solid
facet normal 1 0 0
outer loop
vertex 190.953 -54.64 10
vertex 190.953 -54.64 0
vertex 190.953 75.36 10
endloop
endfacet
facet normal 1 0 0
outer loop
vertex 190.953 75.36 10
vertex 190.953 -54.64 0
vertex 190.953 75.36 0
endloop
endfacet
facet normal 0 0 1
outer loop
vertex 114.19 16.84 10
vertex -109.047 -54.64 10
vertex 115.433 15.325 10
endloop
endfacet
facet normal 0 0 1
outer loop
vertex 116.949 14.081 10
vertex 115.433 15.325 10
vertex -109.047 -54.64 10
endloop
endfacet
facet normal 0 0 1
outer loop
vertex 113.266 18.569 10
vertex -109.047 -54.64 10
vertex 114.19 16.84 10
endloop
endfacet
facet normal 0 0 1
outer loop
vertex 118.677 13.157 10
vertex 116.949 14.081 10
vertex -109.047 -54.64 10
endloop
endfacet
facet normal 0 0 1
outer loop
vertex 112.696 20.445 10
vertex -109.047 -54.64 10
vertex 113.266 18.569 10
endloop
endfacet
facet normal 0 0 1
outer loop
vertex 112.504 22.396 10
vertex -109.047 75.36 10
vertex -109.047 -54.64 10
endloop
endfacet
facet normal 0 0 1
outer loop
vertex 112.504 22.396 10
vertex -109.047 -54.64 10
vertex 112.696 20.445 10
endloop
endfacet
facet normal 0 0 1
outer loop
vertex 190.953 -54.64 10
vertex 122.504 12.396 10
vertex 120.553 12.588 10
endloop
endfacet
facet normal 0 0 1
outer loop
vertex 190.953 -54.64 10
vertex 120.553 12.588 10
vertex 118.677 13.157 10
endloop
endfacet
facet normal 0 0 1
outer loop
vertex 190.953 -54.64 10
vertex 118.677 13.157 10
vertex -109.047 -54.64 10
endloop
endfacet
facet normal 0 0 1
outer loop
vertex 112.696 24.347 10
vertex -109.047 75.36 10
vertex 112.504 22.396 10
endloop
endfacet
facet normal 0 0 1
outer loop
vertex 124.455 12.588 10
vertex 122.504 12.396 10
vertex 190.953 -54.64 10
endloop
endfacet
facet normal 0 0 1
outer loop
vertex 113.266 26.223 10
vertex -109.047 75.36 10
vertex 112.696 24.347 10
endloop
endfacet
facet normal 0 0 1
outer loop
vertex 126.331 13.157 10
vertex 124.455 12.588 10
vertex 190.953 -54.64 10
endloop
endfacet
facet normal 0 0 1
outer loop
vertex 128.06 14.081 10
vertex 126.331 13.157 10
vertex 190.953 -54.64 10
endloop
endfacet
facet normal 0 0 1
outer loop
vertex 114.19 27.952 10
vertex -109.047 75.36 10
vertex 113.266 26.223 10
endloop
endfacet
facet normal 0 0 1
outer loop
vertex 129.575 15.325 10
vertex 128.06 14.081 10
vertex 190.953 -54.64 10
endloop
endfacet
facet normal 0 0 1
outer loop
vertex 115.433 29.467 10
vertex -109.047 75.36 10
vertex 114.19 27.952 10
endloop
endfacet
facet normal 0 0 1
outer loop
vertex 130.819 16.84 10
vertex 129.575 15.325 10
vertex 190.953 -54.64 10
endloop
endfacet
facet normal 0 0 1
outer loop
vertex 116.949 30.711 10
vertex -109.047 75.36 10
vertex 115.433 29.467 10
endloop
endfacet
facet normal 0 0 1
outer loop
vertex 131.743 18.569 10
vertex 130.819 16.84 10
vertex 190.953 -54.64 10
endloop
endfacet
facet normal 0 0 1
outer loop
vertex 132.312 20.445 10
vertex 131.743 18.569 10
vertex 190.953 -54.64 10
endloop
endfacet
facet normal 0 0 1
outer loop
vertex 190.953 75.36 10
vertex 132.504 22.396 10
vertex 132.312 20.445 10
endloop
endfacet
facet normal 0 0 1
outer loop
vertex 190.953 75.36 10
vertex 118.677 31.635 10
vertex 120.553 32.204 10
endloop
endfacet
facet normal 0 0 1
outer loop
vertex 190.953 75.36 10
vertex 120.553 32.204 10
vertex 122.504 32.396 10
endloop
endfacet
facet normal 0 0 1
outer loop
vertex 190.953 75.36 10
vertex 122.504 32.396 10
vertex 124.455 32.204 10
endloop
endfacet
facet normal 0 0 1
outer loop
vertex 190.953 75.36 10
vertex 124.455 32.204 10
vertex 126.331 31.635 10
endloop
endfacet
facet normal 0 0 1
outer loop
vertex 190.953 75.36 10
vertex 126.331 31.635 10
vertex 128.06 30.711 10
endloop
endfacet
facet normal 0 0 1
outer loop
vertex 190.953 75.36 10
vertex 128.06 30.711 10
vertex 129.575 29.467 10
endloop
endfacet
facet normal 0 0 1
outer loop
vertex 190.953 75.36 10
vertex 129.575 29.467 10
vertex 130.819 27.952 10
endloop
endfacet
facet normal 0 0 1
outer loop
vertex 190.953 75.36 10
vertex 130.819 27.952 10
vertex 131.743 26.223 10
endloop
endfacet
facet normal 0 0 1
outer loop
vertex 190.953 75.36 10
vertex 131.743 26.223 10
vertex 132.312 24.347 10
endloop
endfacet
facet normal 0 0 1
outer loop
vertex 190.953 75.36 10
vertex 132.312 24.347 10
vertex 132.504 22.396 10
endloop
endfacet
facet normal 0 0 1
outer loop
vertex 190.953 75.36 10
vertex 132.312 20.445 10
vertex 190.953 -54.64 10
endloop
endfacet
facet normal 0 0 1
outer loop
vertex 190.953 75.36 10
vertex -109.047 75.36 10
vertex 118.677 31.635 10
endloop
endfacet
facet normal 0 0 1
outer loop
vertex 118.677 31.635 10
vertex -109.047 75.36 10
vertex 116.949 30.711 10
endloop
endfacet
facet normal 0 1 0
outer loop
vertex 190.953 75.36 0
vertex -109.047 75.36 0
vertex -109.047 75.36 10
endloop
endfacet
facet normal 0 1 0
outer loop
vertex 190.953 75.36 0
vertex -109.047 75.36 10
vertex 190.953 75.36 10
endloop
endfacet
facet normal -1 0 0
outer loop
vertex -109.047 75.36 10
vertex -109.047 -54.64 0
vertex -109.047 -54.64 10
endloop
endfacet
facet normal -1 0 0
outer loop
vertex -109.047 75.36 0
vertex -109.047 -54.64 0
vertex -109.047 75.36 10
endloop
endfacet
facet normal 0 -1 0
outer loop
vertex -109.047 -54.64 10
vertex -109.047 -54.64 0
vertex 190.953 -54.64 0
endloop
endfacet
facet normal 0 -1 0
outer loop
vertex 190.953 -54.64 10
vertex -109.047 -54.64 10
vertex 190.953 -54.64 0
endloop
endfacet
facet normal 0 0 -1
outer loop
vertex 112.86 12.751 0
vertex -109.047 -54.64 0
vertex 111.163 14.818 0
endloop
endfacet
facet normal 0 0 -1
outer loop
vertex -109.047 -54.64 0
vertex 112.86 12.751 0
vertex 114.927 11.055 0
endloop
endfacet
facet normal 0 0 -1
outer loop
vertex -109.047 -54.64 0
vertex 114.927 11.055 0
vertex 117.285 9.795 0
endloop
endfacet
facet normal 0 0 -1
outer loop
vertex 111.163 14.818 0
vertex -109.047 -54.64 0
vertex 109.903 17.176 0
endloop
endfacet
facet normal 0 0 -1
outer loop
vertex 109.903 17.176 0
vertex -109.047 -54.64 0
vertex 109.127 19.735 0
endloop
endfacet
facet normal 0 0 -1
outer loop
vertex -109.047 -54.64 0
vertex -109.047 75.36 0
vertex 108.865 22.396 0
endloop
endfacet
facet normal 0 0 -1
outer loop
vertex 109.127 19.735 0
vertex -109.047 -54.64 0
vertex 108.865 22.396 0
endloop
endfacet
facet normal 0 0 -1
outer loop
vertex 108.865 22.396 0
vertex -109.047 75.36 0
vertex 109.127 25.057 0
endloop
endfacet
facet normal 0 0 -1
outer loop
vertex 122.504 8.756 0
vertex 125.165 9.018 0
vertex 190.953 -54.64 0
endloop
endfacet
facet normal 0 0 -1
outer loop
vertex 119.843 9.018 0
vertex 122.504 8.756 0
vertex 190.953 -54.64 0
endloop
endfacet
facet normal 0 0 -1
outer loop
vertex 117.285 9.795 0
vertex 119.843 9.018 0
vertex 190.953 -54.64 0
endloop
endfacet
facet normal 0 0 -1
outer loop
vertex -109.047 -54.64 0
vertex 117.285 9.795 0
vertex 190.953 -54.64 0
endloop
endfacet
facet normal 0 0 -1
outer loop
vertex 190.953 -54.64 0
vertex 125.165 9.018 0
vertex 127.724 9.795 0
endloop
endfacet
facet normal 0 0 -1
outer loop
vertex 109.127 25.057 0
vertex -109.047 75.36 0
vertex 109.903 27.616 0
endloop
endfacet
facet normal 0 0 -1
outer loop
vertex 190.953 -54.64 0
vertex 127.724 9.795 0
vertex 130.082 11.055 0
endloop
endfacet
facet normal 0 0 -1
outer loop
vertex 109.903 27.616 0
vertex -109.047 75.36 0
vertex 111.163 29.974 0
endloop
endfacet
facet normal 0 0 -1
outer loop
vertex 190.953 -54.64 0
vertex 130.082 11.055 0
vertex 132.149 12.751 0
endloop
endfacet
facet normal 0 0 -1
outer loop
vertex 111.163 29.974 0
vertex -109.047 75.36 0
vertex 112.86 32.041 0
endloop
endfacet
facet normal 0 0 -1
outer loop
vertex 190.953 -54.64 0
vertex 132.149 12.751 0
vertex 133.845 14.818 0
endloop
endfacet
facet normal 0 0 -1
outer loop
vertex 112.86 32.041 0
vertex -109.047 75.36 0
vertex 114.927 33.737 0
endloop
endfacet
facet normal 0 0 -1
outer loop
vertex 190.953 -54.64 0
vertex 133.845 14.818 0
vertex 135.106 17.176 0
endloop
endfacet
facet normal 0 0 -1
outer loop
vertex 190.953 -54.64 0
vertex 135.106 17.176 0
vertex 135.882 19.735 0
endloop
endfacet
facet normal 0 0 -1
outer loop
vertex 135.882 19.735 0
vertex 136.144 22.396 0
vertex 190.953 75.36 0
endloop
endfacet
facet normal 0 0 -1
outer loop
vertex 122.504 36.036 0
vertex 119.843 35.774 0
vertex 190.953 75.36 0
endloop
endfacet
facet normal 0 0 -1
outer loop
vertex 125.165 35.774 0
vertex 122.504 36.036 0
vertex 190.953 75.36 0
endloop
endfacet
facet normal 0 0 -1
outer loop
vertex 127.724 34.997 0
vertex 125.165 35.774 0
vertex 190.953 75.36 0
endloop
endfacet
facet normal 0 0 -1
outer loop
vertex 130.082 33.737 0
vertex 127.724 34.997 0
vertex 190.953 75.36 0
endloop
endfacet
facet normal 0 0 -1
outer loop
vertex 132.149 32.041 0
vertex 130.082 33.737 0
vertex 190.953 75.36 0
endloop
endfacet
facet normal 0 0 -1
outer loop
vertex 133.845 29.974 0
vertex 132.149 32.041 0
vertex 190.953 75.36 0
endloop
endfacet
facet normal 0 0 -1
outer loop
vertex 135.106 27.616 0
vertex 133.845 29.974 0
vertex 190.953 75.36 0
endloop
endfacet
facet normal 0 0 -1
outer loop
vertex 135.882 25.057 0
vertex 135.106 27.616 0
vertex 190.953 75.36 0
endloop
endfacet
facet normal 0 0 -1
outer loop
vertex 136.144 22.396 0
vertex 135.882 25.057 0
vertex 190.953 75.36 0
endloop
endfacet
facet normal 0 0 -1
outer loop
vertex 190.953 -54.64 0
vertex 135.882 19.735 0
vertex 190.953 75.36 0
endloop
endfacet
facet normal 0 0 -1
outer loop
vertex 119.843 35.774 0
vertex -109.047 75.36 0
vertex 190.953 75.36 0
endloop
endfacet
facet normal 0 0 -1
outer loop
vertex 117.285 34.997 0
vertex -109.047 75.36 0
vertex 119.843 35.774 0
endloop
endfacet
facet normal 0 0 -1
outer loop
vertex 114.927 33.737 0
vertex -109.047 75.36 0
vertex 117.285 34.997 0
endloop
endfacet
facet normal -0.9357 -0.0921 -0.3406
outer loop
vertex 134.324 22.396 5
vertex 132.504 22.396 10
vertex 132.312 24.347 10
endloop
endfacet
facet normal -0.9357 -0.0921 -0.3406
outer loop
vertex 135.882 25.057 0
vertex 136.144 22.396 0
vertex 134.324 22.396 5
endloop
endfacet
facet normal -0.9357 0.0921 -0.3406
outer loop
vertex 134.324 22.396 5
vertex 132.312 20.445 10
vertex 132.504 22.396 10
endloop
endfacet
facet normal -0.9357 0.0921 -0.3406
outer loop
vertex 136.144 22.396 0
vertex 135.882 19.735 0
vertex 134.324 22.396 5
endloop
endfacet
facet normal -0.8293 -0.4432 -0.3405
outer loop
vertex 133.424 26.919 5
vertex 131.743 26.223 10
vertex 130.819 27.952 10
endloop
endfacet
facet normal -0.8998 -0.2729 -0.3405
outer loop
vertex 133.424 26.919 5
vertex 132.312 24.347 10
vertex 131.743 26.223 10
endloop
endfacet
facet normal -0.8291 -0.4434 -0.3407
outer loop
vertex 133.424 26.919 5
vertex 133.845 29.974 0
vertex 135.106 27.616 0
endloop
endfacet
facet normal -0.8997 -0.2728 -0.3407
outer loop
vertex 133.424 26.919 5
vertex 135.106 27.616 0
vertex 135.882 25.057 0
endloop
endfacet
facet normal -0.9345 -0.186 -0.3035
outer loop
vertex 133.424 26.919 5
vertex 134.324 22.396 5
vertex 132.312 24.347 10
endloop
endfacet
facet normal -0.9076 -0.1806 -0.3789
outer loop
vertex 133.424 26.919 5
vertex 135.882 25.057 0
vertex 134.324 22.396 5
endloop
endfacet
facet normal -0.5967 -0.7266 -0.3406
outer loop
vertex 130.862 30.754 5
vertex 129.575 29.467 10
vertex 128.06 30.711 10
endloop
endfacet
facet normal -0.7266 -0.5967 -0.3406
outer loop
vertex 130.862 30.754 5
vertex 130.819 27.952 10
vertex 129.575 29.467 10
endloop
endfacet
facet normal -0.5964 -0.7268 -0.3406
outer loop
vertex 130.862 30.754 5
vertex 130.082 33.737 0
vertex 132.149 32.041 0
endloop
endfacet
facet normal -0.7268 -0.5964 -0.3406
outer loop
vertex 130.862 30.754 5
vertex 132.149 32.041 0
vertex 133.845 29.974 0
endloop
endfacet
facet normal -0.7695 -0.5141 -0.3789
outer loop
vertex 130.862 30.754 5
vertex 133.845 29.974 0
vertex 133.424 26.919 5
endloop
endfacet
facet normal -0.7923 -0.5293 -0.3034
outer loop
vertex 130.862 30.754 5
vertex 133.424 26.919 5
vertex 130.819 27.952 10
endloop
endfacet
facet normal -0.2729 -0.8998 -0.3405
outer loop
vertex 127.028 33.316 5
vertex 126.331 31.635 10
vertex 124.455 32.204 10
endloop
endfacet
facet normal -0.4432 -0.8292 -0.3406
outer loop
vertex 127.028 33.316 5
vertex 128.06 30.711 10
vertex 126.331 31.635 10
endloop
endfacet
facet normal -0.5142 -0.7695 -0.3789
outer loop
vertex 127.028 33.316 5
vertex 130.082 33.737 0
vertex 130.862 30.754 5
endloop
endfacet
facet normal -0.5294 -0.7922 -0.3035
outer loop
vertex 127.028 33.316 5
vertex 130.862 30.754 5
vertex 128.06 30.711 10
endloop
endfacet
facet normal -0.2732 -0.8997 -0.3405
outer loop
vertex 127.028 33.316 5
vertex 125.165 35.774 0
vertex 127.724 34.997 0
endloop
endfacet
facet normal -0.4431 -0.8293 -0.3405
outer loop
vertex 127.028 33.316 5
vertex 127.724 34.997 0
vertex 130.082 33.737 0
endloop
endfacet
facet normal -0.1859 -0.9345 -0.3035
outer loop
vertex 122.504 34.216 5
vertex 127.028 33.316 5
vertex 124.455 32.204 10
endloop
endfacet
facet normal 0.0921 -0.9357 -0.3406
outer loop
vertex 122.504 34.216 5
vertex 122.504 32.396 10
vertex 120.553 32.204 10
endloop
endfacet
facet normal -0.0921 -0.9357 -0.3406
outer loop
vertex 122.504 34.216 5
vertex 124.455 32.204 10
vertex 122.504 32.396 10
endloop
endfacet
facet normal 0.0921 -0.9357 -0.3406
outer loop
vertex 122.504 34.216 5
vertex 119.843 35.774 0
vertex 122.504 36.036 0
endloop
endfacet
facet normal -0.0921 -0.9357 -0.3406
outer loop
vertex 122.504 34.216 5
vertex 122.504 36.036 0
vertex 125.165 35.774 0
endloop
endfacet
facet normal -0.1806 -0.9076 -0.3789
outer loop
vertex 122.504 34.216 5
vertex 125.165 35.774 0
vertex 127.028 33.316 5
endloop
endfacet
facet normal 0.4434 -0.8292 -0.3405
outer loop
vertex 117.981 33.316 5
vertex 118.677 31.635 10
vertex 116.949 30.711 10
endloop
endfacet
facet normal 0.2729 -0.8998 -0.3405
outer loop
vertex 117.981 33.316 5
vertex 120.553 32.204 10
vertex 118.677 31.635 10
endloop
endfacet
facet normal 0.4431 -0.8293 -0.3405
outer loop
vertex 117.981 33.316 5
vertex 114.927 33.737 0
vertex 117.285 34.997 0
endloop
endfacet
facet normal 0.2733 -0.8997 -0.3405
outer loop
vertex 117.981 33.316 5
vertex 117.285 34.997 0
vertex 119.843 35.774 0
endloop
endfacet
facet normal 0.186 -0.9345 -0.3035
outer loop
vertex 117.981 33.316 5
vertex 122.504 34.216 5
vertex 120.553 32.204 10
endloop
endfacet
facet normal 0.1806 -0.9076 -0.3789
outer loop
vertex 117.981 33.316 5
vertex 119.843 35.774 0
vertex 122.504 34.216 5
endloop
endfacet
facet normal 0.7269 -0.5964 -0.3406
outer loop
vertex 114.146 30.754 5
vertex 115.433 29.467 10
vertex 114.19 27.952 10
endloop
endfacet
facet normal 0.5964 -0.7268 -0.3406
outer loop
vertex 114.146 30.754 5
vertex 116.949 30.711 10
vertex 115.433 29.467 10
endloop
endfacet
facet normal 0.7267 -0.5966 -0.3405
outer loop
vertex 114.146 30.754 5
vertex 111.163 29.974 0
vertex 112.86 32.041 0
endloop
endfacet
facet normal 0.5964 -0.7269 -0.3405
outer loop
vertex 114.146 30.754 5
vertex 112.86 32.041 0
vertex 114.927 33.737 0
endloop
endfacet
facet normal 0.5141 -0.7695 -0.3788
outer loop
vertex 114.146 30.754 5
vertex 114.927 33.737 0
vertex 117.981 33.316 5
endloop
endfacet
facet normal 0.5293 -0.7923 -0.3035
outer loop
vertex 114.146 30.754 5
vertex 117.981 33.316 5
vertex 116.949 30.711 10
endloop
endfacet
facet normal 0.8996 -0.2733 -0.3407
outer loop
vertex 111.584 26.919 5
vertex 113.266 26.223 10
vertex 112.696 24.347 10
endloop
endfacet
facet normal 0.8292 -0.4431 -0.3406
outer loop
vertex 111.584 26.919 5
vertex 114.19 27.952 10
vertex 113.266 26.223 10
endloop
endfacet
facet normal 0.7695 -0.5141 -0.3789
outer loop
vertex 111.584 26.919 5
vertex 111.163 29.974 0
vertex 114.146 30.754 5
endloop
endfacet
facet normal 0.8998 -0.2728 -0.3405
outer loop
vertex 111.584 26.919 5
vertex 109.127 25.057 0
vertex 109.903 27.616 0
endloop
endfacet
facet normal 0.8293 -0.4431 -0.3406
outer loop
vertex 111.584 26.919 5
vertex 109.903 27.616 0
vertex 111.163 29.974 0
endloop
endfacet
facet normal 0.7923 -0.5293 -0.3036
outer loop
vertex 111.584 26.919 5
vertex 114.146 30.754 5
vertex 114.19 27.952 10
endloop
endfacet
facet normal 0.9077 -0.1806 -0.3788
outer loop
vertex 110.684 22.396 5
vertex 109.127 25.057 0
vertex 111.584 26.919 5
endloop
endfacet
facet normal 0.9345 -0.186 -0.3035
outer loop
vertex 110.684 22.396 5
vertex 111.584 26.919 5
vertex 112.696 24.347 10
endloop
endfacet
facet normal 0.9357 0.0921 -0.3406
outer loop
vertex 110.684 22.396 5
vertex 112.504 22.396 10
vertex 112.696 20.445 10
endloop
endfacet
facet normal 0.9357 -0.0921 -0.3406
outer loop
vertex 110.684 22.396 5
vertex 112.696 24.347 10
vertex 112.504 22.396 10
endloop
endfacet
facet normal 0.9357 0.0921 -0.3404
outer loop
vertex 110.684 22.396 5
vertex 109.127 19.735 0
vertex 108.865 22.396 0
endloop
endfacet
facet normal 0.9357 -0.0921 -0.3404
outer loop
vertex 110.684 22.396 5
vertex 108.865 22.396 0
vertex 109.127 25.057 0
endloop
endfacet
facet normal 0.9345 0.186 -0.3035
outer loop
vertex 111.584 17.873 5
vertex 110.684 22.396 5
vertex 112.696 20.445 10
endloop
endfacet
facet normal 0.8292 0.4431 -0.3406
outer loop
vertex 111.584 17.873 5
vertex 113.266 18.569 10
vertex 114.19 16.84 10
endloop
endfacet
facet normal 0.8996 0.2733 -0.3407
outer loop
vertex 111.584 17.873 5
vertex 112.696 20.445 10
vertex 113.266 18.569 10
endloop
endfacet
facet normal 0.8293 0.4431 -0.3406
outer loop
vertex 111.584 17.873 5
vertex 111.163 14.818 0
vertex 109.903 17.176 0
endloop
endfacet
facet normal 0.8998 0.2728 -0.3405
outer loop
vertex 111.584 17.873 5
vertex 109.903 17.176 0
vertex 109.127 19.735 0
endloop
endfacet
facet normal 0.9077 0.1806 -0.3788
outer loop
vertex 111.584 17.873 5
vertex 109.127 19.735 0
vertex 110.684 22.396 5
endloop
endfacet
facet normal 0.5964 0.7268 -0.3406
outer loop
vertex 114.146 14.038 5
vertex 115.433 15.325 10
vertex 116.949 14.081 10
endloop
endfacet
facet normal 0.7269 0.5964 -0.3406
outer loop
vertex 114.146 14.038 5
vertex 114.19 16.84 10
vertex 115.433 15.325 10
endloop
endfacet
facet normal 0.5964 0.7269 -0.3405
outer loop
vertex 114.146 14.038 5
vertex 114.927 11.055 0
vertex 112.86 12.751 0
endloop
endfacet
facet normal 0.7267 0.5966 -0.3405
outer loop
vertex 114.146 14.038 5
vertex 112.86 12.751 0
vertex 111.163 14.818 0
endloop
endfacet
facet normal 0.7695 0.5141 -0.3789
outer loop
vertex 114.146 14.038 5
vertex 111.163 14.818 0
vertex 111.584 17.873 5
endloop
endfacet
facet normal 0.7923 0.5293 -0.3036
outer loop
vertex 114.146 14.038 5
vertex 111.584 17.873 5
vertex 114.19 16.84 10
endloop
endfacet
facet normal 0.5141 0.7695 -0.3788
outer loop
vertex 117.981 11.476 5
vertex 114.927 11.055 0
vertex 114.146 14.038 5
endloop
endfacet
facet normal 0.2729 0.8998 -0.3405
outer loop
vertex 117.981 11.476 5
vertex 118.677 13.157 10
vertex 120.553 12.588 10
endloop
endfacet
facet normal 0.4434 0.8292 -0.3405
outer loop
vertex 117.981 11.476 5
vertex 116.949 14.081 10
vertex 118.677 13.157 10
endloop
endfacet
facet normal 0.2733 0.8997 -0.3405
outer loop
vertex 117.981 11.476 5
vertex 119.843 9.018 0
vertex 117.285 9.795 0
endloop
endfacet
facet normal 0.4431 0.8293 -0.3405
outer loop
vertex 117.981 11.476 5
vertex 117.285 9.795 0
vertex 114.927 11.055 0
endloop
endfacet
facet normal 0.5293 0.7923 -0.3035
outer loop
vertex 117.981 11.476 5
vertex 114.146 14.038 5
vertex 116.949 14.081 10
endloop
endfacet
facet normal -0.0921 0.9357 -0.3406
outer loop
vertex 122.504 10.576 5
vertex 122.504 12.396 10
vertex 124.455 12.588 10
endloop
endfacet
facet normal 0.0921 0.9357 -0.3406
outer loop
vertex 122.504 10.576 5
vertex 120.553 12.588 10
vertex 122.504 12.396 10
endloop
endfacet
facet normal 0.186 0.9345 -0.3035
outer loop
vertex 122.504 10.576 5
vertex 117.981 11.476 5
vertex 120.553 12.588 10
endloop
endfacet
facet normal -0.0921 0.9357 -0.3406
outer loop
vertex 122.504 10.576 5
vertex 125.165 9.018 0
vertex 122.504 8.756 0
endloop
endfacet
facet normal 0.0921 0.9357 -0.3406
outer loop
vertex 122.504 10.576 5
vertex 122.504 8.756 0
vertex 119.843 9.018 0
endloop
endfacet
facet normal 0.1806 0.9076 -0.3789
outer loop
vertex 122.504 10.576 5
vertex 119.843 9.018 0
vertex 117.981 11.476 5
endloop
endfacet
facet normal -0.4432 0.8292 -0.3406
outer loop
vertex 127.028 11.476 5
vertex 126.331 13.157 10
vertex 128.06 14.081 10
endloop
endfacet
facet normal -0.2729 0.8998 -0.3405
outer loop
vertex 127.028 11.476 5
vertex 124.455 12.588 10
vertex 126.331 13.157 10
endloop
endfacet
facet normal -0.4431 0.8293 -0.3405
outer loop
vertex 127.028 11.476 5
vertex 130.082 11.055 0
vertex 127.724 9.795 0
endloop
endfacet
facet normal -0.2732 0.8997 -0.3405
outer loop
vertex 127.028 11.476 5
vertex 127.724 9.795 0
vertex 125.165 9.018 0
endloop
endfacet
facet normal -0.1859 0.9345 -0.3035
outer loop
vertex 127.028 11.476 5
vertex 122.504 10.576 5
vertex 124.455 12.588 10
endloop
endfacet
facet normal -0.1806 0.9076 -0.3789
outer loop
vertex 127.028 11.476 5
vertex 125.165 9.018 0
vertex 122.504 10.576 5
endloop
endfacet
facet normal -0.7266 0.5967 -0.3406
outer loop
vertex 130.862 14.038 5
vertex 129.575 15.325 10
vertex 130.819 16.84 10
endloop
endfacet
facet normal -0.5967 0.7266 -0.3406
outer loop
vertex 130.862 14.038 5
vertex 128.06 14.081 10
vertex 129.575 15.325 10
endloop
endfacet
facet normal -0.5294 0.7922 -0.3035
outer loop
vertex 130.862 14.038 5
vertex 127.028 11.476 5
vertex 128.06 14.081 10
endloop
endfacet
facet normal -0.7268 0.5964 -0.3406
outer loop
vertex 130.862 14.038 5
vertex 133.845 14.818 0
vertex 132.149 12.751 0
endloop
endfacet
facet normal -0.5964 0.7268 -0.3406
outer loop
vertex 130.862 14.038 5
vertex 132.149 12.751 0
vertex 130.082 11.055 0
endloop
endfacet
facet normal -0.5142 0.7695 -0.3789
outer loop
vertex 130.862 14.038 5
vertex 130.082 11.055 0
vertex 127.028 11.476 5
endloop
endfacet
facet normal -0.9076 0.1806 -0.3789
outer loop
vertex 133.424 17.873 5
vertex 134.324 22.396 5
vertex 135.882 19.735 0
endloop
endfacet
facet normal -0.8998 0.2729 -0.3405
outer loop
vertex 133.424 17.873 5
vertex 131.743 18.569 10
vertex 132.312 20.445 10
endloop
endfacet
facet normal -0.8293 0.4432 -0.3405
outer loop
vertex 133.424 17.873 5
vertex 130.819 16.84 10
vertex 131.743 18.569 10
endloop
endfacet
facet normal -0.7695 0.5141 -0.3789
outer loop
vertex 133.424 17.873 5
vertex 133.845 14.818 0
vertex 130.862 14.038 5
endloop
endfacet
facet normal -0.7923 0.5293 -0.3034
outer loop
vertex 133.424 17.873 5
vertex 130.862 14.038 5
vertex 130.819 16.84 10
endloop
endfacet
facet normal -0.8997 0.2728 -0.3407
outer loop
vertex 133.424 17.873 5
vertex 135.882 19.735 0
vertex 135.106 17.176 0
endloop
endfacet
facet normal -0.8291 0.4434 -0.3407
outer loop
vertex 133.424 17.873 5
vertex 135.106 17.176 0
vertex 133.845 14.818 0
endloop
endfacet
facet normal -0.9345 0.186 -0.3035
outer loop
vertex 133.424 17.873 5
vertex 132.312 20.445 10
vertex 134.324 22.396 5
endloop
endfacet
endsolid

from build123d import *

# Parameters (mm, degrees)
F0_W     = 300
F0_H     = 130
F1_DEPTH = 10
F2_R     = 10
F3_DEPTH = 25
F3_TAPER = -20


with BuildPart() as f1:
    # F0 (on Top) → F1 (new body)
    with BuildSketch(Plane.XY):
        with Locations((40.9527814948, 10.3597547859)):
            Rectangle(F0_W, F0_H)
    extrude(amount=F1_DEPTH)

    # F2 (on face) → F3 (cut)
    with BuildSketch(Plane.XY.offset(10)):
        with Locations((122.5043311715, 22.395953536)):
            Circle(F2_R)
    extrude(amount=-F3_DEPTH, taper=F3_TAPER, mode=Mode.SUBTRACT)


solid = f1.part
